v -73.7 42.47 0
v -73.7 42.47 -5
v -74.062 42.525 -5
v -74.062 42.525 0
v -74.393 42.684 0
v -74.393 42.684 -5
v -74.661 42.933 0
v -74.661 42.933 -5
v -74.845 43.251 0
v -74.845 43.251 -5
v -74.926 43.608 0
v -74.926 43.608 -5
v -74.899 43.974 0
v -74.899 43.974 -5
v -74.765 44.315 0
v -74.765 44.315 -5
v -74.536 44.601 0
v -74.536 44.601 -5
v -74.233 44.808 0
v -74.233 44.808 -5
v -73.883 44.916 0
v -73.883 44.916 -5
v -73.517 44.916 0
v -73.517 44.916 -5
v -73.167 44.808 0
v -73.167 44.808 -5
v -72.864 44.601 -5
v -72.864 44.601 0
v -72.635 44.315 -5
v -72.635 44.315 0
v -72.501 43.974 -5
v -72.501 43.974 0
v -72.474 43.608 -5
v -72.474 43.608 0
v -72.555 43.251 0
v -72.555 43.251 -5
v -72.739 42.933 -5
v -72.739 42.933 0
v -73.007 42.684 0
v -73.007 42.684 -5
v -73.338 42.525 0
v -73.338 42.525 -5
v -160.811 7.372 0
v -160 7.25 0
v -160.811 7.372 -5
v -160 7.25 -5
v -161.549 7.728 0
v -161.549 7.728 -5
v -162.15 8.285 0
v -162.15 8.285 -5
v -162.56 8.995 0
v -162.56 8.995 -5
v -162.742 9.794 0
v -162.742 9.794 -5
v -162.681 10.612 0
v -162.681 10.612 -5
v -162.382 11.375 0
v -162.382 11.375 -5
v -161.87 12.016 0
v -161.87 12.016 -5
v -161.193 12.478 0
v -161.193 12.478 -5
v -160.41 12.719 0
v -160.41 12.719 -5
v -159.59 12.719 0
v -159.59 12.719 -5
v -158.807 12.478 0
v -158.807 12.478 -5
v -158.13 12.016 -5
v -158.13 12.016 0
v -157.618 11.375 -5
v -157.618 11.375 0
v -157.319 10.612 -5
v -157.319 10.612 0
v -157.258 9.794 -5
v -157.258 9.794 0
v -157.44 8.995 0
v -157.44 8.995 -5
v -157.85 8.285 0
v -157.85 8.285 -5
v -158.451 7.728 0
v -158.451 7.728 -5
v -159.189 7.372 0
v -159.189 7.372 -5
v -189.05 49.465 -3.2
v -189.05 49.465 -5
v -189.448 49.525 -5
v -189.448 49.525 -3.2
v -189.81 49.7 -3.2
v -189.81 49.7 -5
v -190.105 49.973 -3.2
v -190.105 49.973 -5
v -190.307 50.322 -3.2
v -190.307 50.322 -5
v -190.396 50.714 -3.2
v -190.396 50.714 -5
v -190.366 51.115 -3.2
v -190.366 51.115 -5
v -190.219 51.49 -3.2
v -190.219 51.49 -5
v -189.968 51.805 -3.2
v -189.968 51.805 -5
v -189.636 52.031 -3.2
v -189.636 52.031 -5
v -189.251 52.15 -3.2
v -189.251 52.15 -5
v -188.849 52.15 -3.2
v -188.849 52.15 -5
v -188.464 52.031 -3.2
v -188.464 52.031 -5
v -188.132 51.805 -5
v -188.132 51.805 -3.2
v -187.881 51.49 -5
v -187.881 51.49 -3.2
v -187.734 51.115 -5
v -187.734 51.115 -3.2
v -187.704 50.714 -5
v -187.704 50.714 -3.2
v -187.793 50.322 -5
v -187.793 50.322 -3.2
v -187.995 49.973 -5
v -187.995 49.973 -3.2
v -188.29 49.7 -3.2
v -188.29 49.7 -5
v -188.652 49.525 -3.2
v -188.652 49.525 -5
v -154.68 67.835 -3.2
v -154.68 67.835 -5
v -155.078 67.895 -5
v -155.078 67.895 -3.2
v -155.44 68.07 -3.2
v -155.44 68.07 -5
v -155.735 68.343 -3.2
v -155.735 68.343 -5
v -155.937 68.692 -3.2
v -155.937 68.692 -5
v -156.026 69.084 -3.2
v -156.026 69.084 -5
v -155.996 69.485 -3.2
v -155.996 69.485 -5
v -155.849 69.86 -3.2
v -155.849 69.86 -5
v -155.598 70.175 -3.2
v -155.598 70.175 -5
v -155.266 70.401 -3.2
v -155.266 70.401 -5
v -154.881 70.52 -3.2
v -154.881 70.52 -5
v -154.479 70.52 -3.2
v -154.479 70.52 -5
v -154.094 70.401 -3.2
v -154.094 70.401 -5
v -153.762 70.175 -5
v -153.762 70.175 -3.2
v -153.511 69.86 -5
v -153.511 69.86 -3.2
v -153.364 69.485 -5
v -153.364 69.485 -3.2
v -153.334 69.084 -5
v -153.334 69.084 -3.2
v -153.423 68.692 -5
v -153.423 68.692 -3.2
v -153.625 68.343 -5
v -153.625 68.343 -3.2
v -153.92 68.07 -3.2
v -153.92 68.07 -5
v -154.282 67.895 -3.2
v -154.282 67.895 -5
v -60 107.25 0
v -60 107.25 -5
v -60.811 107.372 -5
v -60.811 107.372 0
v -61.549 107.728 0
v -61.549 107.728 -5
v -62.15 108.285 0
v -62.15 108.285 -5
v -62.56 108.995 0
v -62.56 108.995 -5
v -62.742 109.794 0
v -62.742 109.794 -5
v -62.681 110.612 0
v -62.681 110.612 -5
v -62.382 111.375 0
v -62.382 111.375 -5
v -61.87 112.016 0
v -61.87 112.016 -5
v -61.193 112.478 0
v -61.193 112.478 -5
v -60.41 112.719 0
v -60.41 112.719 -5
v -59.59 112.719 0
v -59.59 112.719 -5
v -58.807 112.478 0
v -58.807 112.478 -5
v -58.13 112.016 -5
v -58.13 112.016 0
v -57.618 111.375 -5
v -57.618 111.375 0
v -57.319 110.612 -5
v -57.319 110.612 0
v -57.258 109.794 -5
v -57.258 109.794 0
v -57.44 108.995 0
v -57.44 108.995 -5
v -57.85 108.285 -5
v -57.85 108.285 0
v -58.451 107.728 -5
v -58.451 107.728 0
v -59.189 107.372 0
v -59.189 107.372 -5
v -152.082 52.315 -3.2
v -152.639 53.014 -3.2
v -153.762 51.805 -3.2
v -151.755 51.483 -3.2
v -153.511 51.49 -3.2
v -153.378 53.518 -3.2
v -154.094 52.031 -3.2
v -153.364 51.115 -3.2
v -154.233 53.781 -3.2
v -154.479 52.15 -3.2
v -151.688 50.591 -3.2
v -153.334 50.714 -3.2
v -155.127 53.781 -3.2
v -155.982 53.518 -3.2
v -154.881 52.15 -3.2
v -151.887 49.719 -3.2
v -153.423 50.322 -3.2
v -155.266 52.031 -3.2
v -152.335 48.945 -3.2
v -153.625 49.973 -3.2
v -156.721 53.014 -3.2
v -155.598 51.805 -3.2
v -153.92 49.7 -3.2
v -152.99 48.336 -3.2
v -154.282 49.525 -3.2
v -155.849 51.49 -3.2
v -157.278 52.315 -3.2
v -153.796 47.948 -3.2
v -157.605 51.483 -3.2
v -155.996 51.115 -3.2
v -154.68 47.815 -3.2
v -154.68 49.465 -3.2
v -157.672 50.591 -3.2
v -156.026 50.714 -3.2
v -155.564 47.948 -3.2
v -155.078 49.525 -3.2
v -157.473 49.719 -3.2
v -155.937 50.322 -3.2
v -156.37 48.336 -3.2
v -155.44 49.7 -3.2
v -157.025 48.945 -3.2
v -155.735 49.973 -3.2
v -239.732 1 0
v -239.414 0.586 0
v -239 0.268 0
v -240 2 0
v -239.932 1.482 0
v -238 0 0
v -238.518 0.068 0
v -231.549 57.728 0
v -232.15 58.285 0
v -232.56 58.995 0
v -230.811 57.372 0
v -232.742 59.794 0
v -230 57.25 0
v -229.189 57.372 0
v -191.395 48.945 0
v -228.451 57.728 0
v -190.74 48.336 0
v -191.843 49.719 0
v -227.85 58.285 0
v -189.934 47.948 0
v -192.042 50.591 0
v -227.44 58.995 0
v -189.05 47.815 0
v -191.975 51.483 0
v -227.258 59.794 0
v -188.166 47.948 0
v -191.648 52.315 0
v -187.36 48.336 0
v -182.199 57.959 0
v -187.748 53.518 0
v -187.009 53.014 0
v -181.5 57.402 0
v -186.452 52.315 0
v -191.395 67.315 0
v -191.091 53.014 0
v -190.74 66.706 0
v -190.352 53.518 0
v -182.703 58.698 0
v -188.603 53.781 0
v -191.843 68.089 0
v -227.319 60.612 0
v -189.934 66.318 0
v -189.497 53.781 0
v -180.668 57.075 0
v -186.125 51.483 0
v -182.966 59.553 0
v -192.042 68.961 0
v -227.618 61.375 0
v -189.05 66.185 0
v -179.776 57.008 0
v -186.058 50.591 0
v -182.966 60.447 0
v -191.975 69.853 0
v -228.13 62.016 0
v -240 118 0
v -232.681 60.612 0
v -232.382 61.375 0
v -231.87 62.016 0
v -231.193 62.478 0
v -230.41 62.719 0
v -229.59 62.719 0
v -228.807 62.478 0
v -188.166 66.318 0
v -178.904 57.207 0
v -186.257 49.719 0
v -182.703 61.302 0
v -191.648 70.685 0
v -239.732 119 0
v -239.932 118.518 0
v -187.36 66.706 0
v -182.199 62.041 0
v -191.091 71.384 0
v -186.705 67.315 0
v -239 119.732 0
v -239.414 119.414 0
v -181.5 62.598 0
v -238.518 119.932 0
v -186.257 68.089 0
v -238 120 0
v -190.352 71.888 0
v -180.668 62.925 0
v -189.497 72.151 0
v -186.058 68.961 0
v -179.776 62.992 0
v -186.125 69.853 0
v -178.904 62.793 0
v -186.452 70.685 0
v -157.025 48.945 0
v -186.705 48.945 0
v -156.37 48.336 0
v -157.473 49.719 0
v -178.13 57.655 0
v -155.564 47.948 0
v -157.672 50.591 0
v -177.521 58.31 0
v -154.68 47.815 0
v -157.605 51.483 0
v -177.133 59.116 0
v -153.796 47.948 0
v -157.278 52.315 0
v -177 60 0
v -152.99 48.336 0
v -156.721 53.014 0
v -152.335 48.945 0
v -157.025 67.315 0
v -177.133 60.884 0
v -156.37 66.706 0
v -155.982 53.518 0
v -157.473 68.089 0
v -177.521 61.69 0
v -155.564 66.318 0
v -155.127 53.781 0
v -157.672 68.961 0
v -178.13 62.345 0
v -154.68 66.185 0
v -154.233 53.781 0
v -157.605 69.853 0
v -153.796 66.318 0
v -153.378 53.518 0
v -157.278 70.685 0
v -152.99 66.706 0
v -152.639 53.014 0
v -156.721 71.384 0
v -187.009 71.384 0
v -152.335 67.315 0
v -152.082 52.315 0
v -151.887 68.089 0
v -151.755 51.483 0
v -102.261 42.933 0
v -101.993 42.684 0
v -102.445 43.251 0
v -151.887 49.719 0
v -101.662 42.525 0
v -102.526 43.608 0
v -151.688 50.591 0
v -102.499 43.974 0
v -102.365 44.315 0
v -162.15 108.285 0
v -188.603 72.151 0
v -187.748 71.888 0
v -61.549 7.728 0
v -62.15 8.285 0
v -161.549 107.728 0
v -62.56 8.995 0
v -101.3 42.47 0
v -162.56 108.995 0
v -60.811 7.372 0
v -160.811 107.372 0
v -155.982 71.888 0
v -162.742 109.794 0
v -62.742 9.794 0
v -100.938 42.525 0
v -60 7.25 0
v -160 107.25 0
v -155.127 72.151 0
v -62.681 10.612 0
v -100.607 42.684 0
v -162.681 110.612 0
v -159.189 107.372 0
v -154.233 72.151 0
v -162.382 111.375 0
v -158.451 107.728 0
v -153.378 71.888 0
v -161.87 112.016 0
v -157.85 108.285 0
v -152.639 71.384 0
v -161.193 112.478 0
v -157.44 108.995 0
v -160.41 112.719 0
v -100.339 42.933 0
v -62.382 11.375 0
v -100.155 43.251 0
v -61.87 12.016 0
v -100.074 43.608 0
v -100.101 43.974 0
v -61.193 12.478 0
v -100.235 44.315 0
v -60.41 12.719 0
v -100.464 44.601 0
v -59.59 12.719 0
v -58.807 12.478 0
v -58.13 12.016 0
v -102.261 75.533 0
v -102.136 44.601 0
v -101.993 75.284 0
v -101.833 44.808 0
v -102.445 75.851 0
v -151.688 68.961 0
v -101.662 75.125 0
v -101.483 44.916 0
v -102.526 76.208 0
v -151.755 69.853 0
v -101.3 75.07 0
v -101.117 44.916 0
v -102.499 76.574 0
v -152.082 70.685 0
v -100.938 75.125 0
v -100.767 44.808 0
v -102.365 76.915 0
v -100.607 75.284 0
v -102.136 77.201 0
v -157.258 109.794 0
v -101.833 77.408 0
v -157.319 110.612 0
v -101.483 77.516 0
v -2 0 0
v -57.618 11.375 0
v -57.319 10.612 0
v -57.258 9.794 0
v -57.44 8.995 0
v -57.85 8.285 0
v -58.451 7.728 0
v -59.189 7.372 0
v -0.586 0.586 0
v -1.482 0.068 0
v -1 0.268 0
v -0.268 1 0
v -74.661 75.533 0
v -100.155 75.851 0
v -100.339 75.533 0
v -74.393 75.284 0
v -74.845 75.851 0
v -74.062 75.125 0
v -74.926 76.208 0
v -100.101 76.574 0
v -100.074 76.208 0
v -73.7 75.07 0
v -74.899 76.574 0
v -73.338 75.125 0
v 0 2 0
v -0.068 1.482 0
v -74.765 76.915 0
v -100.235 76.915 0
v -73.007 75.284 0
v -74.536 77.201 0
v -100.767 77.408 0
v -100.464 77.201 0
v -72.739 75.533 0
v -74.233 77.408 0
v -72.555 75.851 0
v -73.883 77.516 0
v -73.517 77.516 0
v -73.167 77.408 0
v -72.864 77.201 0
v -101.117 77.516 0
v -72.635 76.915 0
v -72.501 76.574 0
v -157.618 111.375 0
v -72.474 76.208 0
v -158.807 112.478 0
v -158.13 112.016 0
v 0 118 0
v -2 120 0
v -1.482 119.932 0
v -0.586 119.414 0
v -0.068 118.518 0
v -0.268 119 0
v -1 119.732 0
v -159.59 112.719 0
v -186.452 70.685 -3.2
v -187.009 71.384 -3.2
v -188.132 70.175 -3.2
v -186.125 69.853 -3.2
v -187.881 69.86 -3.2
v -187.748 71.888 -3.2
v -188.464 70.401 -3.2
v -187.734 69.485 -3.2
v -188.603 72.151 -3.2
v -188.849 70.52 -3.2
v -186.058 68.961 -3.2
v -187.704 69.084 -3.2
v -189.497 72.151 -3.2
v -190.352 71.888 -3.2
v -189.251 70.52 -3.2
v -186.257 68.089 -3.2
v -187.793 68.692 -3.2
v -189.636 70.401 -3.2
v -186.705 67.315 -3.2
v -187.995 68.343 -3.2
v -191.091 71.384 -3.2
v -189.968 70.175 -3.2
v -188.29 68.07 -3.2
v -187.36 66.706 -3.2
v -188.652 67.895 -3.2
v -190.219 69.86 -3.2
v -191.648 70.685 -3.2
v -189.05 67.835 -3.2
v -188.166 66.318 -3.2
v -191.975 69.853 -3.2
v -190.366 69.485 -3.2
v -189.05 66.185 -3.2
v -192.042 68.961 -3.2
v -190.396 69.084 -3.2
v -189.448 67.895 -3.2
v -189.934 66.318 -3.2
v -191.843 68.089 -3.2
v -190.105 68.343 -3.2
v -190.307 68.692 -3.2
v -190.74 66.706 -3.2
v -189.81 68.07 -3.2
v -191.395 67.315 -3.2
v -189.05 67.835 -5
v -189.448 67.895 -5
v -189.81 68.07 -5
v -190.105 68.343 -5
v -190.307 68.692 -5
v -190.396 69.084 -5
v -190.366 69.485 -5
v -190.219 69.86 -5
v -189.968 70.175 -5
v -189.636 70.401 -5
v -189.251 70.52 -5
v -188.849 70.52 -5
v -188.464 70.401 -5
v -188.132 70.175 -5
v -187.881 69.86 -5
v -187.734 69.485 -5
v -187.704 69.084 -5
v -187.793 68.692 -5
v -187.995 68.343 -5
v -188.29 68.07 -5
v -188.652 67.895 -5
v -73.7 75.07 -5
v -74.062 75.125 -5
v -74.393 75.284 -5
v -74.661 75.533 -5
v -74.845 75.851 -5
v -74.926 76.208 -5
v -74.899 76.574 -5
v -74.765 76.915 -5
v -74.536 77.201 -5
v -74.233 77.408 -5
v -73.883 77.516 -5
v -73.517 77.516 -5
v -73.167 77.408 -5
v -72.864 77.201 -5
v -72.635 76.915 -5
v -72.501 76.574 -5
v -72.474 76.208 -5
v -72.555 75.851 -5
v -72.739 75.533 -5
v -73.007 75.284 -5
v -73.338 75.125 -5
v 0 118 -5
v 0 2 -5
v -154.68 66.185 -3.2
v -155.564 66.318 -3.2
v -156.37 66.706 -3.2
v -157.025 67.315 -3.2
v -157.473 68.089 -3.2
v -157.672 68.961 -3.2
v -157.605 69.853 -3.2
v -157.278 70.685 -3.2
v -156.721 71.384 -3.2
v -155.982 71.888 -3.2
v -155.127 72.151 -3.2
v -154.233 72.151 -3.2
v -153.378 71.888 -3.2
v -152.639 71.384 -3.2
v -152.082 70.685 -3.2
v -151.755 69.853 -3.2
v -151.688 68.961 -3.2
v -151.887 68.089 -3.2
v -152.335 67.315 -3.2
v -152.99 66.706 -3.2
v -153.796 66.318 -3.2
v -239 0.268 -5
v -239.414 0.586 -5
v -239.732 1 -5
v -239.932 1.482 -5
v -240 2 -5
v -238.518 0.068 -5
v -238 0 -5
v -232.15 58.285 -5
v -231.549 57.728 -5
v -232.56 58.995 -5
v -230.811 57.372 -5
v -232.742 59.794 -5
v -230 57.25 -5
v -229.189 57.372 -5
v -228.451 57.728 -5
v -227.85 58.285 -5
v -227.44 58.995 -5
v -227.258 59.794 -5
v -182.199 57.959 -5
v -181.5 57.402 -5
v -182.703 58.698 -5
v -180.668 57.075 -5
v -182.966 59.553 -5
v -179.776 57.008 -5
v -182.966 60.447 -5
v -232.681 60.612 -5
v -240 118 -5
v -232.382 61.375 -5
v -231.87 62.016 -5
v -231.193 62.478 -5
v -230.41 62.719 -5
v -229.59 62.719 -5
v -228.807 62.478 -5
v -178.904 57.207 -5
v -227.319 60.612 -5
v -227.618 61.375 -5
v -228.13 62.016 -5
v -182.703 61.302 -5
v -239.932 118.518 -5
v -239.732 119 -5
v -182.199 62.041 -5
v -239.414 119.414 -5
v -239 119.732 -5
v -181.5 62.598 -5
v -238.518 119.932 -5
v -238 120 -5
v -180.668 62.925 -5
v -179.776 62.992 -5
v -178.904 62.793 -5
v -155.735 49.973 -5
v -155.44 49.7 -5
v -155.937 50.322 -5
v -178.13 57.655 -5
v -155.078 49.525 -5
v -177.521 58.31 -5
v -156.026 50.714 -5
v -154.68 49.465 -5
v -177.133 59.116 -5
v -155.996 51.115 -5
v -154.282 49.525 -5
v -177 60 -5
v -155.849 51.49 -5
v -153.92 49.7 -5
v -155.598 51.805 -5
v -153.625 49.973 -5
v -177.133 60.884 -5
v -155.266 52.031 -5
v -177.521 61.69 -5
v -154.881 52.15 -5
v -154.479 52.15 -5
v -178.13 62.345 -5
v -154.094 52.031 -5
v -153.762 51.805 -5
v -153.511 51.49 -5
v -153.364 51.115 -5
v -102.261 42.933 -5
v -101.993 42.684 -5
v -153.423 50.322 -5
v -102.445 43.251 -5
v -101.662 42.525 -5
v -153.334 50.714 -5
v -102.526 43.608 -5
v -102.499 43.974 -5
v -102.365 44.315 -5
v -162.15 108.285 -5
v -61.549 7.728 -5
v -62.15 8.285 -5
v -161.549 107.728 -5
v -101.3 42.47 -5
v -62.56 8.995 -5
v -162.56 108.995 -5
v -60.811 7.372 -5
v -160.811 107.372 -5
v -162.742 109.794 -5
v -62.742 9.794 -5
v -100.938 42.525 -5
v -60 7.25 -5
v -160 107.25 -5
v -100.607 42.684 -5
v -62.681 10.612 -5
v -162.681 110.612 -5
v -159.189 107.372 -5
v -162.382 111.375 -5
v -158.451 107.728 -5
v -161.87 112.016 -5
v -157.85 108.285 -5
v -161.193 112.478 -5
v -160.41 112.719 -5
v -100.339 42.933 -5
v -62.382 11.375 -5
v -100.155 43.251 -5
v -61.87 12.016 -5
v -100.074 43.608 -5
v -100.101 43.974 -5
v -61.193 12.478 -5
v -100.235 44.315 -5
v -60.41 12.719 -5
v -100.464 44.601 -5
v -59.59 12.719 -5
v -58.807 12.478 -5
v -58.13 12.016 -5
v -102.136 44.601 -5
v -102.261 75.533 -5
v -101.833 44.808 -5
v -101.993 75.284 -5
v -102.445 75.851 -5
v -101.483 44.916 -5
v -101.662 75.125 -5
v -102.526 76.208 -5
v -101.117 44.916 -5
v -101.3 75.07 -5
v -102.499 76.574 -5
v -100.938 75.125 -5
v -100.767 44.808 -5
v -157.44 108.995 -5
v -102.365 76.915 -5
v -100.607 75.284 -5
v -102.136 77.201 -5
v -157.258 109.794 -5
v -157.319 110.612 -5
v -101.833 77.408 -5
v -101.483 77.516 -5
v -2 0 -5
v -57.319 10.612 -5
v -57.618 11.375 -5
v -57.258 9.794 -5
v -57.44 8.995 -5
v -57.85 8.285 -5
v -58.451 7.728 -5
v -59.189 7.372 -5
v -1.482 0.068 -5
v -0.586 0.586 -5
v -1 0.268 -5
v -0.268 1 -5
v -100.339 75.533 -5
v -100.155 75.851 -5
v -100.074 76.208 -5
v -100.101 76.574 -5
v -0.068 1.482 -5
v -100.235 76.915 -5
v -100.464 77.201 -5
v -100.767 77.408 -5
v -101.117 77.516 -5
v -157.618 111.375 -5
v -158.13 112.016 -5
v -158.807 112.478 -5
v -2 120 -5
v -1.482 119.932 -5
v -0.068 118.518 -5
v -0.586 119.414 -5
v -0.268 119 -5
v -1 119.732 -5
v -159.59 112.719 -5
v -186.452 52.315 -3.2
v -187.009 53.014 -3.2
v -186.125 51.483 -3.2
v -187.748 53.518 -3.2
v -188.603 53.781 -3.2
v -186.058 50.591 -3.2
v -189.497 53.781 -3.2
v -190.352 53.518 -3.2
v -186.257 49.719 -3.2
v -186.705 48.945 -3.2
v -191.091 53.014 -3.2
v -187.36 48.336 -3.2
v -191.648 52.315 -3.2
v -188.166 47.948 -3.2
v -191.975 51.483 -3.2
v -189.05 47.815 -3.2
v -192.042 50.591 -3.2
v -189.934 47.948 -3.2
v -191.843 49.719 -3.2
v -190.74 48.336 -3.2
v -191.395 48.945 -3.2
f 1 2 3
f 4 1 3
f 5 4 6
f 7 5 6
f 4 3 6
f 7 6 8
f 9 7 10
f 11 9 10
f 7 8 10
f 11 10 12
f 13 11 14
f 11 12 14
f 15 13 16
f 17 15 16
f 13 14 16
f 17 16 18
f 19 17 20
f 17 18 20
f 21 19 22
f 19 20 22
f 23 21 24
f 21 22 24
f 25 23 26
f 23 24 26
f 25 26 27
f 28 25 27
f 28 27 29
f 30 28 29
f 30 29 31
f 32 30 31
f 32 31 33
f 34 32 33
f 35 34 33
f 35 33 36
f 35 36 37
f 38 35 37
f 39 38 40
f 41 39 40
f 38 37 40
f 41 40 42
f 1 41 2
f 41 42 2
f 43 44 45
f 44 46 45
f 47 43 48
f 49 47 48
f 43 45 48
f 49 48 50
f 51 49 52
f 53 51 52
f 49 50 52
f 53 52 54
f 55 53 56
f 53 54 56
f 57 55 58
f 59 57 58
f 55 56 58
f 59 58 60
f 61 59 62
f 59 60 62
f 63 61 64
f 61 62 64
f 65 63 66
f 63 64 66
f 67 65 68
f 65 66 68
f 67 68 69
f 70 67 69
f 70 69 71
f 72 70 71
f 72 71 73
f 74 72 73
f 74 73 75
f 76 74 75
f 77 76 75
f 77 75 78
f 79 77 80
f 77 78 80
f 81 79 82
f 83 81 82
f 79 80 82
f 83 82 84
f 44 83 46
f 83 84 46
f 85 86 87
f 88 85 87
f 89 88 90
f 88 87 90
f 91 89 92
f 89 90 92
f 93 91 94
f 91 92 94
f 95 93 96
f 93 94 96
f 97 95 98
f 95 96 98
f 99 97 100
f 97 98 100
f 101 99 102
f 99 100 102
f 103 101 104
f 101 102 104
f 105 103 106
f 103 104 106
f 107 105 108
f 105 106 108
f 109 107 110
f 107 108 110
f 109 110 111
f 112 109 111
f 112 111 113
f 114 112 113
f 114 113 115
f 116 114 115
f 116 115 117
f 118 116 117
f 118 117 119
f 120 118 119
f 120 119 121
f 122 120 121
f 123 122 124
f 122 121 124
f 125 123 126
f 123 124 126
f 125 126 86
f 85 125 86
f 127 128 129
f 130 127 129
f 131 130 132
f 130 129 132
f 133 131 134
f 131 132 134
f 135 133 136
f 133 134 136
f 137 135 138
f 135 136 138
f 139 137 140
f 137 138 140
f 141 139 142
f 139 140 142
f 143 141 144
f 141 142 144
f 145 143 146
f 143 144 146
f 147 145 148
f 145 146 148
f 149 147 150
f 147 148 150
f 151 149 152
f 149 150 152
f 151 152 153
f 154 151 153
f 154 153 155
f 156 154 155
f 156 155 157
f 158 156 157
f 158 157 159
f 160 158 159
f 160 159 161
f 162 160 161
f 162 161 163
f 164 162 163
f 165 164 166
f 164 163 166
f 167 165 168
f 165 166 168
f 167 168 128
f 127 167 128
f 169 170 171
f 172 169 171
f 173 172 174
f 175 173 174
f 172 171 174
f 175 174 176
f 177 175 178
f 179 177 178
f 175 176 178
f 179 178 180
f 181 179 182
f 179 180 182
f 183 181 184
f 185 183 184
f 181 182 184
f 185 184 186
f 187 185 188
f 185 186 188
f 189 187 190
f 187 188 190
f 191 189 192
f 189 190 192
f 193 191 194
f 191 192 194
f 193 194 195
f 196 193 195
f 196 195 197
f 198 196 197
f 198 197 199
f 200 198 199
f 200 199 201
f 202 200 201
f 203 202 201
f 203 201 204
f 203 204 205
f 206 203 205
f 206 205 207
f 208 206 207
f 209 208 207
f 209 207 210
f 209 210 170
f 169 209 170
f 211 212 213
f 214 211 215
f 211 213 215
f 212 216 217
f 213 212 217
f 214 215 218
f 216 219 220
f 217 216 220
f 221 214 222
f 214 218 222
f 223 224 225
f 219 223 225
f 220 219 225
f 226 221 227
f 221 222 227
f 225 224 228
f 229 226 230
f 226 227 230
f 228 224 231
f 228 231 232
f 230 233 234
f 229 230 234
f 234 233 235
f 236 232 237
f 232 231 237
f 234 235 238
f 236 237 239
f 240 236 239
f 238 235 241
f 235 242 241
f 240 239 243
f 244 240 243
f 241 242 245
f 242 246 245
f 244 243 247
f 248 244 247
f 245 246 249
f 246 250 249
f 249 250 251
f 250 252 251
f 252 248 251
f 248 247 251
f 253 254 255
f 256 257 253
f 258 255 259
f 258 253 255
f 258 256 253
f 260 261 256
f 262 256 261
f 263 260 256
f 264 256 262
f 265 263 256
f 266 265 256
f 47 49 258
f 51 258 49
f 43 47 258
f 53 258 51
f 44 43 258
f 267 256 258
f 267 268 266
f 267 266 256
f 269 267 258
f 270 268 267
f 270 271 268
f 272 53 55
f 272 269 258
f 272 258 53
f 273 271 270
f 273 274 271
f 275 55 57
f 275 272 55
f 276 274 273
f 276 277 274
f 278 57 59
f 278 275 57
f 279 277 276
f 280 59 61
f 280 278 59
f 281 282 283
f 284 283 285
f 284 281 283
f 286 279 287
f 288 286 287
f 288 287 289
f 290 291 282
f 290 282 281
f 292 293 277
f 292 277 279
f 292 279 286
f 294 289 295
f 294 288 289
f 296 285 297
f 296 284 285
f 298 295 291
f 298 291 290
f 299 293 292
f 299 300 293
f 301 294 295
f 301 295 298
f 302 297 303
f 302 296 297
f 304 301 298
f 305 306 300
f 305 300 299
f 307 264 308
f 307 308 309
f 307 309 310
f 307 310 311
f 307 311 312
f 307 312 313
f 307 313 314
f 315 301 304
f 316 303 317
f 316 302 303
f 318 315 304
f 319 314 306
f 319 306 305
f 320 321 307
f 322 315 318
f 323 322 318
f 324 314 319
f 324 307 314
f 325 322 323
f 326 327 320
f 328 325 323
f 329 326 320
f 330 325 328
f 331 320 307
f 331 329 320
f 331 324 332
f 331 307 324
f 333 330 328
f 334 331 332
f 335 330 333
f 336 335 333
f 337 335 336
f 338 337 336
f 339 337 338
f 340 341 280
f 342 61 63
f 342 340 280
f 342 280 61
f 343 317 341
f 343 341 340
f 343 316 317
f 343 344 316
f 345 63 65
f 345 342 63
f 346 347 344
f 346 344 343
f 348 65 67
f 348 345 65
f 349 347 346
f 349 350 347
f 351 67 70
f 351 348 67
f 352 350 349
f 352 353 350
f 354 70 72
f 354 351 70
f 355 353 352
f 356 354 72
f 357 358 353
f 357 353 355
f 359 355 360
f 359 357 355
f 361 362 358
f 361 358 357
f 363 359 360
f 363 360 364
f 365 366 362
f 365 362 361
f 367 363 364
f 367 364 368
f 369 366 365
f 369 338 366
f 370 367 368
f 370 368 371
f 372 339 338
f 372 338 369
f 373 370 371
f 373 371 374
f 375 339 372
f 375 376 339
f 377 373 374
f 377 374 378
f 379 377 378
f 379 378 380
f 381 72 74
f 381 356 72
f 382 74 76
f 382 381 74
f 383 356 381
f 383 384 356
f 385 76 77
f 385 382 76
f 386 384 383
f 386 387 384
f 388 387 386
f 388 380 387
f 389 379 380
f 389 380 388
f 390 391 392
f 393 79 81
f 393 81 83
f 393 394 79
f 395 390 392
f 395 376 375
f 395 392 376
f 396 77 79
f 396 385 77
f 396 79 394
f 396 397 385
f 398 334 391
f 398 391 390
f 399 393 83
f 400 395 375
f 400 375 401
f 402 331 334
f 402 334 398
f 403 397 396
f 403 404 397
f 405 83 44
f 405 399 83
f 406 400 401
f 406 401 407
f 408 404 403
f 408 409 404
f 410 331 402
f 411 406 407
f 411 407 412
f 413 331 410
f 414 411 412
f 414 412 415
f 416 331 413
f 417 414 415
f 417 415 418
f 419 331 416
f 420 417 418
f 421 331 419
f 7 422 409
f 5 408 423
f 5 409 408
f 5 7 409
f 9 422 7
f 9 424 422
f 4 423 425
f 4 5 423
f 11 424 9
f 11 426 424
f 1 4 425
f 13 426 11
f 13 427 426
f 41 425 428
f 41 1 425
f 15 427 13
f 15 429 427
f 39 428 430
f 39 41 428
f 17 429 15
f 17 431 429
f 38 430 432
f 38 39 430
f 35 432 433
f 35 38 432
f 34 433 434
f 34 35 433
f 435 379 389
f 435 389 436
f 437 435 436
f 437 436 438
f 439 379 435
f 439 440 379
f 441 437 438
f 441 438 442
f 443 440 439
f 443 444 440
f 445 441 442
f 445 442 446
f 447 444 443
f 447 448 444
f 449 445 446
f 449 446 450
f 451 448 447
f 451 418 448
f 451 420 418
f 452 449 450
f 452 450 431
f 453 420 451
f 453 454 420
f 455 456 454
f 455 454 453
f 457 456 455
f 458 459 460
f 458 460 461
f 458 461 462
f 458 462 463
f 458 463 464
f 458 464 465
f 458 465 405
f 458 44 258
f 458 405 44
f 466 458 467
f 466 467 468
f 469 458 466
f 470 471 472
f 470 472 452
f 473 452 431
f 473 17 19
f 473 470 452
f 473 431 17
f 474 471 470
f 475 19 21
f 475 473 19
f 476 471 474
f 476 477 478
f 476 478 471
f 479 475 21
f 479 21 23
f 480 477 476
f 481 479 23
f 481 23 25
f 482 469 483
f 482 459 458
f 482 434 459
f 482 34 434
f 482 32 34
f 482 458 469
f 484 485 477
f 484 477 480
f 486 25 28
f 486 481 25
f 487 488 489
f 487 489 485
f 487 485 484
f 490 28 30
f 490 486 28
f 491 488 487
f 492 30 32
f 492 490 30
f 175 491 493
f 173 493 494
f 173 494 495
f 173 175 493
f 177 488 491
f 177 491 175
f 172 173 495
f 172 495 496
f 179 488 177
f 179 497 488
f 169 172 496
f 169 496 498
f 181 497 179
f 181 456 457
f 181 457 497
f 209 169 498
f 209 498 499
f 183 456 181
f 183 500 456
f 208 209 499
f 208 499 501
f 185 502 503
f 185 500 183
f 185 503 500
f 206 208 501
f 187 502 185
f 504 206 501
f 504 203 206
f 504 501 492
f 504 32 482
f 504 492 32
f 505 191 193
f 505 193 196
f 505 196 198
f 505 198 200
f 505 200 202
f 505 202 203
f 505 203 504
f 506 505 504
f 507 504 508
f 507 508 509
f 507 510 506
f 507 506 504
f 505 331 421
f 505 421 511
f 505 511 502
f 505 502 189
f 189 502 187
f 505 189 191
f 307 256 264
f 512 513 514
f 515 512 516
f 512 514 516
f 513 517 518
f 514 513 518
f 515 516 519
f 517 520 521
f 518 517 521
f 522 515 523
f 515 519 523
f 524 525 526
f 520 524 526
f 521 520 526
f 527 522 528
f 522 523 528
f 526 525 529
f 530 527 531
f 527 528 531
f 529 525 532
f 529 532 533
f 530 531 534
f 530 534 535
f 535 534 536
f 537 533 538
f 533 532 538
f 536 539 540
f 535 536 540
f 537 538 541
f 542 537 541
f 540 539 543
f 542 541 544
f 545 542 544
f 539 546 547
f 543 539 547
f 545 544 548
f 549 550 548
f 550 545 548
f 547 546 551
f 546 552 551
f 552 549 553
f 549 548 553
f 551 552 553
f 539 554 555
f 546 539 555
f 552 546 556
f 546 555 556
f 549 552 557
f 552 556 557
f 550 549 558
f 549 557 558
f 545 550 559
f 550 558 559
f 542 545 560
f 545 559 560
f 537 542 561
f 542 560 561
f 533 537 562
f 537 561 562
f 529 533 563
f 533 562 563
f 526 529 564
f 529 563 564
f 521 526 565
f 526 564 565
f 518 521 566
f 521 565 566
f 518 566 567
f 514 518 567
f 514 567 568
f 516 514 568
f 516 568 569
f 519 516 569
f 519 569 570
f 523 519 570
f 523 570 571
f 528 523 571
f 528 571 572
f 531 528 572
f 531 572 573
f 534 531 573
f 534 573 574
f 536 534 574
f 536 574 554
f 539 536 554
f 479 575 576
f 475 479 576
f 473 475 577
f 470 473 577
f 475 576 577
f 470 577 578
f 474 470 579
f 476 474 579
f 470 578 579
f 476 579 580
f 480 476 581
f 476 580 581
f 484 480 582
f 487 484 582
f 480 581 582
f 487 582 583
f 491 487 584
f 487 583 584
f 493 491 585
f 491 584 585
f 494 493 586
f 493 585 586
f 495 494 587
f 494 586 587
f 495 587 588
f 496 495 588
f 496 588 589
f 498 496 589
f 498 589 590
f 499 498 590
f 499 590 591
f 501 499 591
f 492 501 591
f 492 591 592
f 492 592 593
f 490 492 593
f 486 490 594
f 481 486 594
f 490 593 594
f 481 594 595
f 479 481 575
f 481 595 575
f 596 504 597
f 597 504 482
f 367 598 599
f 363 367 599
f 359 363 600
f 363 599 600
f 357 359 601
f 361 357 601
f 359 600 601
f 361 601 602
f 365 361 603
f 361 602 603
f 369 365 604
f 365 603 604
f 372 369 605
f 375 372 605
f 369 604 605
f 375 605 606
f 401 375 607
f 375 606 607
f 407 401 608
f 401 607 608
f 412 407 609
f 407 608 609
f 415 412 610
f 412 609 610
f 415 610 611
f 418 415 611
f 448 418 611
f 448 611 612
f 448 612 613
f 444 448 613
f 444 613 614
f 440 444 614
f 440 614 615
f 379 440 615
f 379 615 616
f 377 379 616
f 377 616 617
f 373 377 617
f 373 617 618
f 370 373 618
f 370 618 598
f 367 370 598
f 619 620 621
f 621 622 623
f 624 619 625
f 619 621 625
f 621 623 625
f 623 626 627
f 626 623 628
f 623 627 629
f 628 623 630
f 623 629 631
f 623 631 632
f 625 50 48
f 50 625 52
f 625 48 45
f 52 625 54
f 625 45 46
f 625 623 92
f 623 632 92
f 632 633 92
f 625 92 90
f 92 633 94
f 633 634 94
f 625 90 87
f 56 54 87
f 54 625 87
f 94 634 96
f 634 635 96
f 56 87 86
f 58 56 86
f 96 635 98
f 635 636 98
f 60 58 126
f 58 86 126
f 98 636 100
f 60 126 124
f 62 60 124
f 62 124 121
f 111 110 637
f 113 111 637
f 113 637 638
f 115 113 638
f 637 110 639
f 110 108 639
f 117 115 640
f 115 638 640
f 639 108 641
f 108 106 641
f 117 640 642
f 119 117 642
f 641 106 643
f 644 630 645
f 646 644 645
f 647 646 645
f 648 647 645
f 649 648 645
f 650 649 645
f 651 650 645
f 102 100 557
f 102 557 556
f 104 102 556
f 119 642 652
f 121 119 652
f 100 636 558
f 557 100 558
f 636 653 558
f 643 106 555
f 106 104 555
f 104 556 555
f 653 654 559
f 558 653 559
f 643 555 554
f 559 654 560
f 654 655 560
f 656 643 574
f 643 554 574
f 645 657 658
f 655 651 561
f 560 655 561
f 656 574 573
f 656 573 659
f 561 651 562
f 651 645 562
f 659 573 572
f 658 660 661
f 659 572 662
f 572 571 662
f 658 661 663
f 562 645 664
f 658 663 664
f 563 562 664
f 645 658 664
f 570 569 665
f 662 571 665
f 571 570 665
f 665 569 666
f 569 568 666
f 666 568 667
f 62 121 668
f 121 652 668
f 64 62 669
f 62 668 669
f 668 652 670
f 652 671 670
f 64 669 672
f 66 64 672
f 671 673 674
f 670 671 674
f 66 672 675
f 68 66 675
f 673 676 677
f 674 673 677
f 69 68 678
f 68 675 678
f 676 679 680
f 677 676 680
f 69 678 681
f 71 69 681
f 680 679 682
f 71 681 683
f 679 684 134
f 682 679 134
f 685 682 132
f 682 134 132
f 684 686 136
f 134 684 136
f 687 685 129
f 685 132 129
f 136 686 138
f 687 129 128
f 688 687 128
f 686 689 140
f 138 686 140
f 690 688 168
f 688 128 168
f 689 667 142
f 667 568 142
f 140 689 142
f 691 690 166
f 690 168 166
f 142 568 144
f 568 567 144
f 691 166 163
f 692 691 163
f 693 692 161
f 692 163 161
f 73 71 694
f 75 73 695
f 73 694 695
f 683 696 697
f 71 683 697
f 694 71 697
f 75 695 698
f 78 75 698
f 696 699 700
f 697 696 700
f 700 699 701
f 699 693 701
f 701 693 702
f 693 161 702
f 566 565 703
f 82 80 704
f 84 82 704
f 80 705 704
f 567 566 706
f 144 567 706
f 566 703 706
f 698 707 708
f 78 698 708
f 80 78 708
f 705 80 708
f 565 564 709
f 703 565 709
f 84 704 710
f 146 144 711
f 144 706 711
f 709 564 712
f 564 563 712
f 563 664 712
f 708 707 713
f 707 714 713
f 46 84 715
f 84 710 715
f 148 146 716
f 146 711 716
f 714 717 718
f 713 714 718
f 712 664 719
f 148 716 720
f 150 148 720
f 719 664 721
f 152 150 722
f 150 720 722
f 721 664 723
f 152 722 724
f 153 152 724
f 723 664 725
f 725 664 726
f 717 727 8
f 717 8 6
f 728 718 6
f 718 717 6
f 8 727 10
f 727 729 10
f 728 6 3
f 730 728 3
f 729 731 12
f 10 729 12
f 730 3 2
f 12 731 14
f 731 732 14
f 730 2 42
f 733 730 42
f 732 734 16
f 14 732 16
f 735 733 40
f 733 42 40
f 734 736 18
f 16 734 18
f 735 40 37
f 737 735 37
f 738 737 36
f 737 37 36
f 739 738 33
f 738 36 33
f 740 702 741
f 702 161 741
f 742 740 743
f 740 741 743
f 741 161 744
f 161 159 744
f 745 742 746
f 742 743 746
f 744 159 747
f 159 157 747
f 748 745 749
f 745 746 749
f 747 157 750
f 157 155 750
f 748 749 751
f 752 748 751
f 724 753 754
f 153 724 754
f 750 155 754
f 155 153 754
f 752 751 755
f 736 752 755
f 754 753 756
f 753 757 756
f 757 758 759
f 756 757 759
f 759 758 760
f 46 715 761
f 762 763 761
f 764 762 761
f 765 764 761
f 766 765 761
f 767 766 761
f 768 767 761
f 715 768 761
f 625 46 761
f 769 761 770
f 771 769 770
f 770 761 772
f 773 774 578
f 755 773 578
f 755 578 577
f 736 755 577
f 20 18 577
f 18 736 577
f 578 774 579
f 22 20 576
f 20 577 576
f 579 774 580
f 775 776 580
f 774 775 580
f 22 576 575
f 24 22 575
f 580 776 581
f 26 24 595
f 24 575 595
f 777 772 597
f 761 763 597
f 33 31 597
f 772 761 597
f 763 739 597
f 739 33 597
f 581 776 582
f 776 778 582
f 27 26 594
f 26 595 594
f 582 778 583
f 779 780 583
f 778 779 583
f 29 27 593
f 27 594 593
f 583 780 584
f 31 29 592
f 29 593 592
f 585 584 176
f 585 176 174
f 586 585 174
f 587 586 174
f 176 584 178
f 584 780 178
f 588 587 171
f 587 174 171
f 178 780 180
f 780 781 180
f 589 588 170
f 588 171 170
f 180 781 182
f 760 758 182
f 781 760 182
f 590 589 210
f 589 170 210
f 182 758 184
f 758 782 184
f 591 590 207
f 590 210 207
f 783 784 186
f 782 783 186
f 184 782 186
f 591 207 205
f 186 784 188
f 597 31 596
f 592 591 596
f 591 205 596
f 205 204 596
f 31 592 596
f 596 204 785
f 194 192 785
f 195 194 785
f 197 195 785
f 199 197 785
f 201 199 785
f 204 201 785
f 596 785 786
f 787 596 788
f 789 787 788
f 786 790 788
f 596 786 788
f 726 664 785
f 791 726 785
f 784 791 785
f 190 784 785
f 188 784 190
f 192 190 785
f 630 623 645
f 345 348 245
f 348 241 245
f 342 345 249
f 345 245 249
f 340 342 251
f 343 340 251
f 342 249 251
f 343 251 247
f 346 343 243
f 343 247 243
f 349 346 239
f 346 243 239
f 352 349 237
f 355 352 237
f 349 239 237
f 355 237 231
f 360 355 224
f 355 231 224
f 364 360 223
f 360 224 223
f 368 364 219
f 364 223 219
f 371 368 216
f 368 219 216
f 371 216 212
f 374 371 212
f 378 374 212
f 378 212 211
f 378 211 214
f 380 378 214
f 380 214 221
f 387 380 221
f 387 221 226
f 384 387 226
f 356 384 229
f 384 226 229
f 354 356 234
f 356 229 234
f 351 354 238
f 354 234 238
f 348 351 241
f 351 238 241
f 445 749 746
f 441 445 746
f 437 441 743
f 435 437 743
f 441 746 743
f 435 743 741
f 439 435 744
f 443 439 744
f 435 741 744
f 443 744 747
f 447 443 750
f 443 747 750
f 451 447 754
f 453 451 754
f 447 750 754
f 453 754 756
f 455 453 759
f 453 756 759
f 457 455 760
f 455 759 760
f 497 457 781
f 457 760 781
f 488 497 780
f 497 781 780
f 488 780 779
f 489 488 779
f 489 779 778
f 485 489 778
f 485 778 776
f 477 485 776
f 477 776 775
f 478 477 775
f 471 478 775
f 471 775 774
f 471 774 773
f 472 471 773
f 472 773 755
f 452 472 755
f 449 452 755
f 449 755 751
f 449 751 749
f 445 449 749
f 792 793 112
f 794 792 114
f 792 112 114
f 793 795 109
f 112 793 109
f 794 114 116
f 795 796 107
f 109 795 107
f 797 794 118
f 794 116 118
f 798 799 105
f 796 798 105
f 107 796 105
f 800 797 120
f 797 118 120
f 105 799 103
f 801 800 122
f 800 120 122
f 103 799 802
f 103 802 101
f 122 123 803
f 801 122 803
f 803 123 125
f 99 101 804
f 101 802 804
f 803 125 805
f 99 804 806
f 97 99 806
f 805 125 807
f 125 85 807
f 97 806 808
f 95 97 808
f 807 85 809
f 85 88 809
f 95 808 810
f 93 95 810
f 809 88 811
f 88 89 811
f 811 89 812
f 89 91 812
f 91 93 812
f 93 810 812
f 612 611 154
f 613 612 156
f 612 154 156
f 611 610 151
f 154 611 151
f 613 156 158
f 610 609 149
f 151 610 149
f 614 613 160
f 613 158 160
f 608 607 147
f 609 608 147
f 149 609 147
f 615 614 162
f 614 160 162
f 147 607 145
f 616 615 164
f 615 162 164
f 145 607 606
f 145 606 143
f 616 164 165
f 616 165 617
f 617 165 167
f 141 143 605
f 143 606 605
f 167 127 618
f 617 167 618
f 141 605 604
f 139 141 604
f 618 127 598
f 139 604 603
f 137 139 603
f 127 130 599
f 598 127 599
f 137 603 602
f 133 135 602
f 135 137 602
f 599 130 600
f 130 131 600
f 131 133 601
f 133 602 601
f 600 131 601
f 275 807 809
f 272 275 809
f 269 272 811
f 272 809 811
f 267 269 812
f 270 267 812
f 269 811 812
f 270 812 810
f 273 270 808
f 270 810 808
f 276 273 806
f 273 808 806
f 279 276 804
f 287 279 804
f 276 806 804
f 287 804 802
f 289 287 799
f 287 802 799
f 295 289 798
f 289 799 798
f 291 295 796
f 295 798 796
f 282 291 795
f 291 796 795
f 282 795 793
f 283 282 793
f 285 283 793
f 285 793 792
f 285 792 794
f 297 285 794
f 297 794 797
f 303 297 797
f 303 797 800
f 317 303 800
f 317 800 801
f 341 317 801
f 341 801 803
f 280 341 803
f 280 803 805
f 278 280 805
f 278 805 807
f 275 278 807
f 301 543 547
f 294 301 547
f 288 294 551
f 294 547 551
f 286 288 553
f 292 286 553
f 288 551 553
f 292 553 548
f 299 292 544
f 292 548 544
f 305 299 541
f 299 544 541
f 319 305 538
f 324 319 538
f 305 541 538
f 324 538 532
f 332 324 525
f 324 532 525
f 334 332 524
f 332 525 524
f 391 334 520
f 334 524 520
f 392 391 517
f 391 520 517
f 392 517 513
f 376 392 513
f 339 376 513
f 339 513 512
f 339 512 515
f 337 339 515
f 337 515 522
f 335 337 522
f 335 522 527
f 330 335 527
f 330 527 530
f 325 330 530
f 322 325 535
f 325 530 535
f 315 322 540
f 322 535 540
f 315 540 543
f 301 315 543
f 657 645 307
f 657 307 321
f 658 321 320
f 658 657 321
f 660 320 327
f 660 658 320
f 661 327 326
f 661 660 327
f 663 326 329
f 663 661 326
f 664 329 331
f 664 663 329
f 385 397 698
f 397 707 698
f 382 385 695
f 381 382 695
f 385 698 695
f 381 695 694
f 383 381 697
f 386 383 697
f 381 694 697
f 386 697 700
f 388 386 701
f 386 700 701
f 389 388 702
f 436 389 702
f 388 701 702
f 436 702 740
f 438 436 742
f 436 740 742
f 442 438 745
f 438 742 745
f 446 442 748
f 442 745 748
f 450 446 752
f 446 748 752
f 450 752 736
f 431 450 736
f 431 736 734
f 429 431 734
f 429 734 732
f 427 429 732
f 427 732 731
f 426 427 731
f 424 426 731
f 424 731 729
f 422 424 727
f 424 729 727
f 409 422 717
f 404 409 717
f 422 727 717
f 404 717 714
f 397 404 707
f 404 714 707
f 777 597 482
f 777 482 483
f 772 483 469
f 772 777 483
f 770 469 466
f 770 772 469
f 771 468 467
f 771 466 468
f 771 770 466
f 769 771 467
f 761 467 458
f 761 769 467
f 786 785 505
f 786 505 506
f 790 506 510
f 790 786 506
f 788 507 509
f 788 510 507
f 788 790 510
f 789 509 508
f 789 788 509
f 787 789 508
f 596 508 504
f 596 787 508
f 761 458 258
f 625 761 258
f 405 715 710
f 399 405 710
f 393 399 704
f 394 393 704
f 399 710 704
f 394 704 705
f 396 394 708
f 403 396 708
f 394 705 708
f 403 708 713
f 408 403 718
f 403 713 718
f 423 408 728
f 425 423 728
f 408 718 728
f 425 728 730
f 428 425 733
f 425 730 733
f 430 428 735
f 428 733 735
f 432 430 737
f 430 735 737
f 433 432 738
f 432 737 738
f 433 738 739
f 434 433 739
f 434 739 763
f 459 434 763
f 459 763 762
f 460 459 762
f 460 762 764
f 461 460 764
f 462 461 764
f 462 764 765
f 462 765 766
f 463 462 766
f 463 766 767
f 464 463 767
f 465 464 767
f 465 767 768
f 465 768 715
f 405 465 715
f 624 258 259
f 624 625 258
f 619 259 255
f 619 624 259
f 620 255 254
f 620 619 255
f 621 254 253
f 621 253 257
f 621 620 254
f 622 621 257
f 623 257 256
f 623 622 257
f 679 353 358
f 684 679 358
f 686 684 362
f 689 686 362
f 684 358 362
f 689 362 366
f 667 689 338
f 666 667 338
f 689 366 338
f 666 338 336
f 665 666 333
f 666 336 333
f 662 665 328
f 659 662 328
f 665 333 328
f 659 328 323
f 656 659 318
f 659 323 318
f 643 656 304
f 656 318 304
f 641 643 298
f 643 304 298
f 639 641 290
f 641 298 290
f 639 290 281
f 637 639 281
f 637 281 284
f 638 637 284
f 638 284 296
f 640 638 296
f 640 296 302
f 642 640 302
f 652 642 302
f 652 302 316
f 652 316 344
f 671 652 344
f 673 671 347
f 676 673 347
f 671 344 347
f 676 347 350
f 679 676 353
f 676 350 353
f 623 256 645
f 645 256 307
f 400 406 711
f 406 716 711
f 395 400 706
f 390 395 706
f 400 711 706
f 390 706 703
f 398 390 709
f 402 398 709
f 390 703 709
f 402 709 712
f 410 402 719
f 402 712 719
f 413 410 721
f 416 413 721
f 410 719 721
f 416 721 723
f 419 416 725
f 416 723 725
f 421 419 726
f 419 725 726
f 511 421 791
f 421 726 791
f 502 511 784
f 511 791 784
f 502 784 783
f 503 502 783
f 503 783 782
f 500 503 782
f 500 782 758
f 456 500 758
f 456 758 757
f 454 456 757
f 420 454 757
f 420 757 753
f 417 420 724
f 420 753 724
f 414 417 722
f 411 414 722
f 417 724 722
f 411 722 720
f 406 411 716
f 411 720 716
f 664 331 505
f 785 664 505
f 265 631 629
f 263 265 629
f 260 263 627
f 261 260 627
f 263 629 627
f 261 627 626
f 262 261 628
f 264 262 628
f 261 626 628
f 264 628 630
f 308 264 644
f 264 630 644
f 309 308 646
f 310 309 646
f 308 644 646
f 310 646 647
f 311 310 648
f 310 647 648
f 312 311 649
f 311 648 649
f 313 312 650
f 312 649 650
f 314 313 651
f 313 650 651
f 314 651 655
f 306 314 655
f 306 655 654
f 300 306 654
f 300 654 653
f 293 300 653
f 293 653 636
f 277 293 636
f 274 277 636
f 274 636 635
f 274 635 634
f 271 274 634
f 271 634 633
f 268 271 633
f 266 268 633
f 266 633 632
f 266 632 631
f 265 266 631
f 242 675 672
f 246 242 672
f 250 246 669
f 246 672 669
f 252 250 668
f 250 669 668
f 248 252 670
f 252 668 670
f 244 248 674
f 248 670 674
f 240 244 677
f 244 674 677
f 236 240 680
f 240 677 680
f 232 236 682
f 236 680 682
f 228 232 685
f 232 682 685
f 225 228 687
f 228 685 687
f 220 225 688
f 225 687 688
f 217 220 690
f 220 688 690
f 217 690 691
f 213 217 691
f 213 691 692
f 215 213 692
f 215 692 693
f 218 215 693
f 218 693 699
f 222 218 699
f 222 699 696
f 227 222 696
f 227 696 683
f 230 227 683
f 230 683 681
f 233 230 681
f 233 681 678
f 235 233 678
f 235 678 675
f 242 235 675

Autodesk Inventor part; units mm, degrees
ref_plane "YZ Plane" through (0, 0, 0) normal (1, 0, 0) x (0, 1, 0)
ref_plane "XZ Plane" through (0, 0, 0) normal (0, 1, 0) x (-1, 0, 0)
ref_plane "XY Plane" through (0, 0, 0) normal (0, 0, 1) x (1, 0, 0)
sketch "Skizze3" plane through (0, 0, 0) normal (0, 0, 1) x (1, 0, 0)
  line L0 (0, 0) -> (-120, 0)
  line L1 (-240, 0) -> (-240, 120)
  line L2 (-240, 120) -> (0, 120)
  line L3 (0, 120) -> (0, 0)
  line L4 (-248.2253, 60) -> (-229.9902, 60) construction
  line L5 (-189.05, 39.8483) -> (-189.05, 104.036) construction
  line L6 (-205.9145, 69.185) -> (-155.0384, 69.185) construction
  line L7 (-154.68, 50.3276) -> (-154.68, 100.4743) construction
  line L8 (-153.2541, 50.815) -> (-196.0103, 50.815) construction
  circle A0 centre (-180, 60) radius 3
  line L9 (-105, 40) -> (-80, 40)
  line L10 (-80, 40) -> (-80, 80)
  line L11 (-80, 80) -> (-105, 80)
  line L12 (-105, 80) -> (-105, 40)
  line L13 (-120, -37.5982) -> (-120, -22.8575) construction
  line L14 (-120, 0) -> (-240, 0)
  line L15 (-60, -24.367) -> (-60, 44.367) construction
  circle A1 centre (-180, 60) radius 20.5
  point P0 (-240, 60)
  point P1 (-189.05, 69.185)
  point P2 (-189.05, 50.815)
  point P3 (-154.68, 50.815)
  point P4 (-154.68, 69.185)
  point P5 (-105, 60)
  point P6 (-101.3, 43.7)
  point P7 (-230, 60)
  point P8 (-120, 120)
  point P9 (-180, 0)
  point P10 (-60, 0)
  point P11 (-60, 10)
  point P12 (-160, 10)
  point P13 (-160, 110)
  point P14 (-60, 110)
  point P15 (-60, 10)
  dimension "d4" = 120
  dimension "d5" = 240
  dimension "d6" = 60
  dimension "d8" = 9.05
  dimension "d9" = 34.37
  dimension "d11" = 9.185
  dimension "d12" = 18.37
  dimension "d17" = 6
  dimension "d18" = 40
  dimension "d19" = 25
  dimension "d20" = 75
  dimension "d21" = 3.7
  dimension "d22" = 3.7
  dimension "d39" = 10
  dimension "d40" = 10
  dimension "d41" = 10
  dimension "d42" = 10
  dimension "d43" = 10
  dimension "d51" = 80
  dimension "d52" = 80
  dimension "d53" = 41
extrude "Extrusion3" add sketch "Skizze3" against normal blind 5 contours L0 L14 L1 L2 L3 | L12 L11 L10 L9 | A1
hole "Bohrung1" at (-101.3, 43.7, 0) direction (0, 0, -1) diameter 2.459 end through all thread size "M3x0.5" class "6H" standard "ISO Metric profile"
pattern_linear "Rechteckige Anordnung1" count 2 spacing 32.6 along (0, 1, 0) count 2 spacing 27.6 along (1, 0, 0) of "Bohrung1"
fillet "Rundung1" radius 2 4 edges at (-240, 120, -2.5) (-240, 0, -2.5) (0, 120, -2.5) (0, 0, -2.5)
hole "Bohrung2" at (-230, 60, 0) at (-60, 10, 0) at (-160, 10, 0) at (-160, 110, 0) at (-60, 110, 0) direction (0, 0, -1) diameter 5.5 end through all
hole "Bohrung3" at (-189.05, 69.185, 0) at (-189.05, 50.815, 0) at (-154.68, 50.815, 0) at (-154.68, 69.185, 0) direction (0, 0, -1) diameter 2.7 end through all counterbore diameter 6 counterbore depth 3.2
equation "\"d22\" = d21"
equation "\"d41\" = d40"
equation "\"d42\" = d41"
equation "\"d43\" = d42"
equation "\"d34\" = d18 - 2 * d22"
properties part number "BT002_trajan20_21" material "Acryl"
